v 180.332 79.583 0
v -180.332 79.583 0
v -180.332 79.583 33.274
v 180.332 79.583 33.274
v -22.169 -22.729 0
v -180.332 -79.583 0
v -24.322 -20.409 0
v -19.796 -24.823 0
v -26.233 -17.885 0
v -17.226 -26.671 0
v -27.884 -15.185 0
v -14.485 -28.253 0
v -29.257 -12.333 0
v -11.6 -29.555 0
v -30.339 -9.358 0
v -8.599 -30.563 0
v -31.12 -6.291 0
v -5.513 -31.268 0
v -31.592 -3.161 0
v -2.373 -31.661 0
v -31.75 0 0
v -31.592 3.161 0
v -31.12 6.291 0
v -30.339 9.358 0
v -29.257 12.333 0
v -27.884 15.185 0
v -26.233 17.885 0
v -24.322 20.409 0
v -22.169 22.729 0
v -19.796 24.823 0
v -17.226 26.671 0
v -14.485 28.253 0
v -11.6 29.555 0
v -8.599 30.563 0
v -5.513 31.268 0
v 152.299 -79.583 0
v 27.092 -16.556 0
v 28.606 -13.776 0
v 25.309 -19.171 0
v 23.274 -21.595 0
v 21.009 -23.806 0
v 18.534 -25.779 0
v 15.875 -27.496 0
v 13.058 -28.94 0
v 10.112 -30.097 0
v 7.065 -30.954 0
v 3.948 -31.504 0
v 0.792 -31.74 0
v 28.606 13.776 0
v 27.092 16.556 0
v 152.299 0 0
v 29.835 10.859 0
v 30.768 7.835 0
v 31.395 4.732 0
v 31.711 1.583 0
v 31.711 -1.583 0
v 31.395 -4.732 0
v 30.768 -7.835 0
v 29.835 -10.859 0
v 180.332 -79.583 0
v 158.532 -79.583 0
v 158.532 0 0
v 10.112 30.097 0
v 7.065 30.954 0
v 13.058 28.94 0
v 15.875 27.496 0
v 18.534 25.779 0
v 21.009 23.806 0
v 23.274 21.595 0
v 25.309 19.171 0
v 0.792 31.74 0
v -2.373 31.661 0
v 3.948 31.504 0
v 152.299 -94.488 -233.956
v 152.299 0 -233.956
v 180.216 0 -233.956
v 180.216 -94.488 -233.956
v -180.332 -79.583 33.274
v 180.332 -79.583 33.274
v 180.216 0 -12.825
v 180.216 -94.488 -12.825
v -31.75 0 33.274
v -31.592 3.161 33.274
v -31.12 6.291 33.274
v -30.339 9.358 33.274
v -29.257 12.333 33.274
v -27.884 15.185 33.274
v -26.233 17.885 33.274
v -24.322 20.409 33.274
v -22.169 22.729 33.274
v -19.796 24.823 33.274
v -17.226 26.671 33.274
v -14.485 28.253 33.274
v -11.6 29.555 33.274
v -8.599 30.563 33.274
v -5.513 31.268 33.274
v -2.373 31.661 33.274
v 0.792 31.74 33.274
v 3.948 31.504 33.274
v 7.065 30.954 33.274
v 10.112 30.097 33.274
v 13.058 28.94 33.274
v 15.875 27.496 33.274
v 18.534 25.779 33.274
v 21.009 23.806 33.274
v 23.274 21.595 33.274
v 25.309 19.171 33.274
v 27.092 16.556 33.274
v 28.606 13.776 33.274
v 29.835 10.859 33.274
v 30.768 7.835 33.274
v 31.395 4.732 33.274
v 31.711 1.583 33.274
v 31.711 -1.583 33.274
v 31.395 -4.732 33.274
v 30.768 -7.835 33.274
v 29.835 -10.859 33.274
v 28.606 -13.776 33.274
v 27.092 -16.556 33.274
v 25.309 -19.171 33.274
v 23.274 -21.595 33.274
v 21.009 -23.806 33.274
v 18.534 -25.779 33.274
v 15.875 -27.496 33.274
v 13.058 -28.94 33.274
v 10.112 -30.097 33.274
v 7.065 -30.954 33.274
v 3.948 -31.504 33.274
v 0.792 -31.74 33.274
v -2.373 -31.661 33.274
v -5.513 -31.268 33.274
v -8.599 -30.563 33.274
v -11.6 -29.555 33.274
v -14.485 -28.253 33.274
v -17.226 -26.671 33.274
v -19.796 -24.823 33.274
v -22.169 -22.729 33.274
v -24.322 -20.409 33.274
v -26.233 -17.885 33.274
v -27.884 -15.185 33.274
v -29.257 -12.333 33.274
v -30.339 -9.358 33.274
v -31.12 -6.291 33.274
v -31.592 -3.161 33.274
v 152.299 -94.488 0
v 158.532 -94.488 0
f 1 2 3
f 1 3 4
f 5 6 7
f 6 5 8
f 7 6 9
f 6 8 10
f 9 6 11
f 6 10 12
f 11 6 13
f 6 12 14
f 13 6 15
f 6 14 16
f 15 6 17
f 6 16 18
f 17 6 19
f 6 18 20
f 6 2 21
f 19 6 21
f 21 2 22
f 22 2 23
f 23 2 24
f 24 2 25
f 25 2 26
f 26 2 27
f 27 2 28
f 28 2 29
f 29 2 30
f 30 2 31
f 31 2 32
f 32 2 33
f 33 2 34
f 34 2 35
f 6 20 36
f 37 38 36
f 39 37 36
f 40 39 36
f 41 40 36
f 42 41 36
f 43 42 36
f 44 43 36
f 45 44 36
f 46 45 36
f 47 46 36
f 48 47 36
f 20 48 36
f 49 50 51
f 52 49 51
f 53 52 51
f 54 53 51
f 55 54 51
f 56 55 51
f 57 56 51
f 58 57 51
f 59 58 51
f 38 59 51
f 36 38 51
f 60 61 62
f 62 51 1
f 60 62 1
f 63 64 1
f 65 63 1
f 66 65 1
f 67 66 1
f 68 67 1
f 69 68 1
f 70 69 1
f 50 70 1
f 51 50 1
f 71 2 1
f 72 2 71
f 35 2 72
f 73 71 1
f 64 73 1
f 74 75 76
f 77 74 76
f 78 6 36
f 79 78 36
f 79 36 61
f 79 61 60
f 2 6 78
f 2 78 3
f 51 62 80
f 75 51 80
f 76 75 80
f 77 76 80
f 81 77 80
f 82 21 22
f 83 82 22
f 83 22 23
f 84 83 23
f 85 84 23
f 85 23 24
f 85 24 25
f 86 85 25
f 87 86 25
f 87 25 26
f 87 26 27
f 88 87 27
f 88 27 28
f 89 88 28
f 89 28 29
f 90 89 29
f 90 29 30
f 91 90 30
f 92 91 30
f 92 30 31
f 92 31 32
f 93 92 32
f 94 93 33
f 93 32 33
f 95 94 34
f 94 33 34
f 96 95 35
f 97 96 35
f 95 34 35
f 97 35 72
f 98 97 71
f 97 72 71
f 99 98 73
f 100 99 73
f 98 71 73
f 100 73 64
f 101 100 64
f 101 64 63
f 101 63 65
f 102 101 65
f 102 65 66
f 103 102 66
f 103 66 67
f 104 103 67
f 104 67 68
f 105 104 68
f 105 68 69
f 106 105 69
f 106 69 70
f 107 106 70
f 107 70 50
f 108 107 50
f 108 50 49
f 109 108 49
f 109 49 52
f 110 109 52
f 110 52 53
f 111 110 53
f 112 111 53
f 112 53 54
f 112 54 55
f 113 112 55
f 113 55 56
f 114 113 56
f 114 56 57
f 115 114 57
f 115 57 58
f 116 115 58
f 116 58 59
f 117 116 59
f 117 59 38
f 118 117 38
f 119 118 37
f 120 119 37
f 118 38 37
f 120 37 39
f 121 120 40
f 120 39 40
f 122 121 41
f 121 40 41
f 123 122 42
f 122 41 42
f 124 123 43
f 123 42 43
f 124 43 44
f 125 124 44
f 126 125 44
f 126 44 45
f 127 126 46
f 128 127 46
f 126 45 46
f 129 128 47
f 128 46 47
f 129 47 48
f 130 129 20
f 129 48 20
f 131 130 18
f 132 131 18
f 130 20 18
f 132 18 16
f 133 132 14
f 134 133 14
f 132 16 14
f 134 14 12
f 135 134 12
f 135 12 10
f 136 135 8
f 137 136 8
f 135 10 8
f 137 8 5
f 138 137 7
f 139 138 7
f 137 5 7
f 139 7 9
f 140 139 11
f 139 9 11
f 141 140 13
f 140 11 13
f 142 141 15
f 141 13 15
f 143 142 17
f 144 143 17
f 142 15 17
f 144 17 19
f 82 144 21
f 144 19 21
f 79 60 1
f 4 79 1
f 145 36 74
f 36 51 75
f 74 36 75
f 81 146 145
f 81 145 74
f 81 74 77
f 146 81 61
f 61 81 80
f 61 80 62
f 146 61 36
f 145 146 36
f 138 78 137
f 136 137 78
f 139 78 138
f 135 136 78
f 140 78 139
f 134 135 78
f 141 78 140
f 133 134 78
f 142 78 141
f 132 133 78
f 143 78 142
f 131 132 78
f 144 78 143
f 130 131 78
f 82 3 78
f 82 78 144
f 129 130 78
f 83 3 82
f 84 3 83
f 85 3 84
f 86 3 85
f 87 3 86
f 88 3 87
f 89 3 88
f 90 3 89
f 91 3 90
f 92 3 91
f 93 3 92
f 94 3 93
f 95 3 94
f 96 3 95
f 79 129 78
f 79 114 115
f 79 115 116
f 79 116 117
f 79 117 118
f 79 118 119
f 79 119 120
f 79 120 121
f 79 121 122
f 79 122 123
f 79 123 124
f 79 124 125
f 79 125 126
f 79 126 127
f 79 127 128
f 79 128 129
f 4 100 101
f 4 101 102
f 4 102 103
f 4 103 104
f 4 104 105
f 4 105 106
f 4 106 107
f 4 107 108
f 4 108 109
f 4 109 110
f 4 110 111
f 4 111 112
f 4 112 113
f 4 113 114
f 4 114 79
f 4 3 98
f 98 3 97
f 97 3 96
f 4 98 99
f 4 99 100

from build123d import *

# Parameters (mm, degrees)
F0_W     = 360.66404
F0_H     = 159.165882
F1_DEPTH = 33.274
F3_DEPTH = 94.488
F5_D     = 63.5


with BuildPart() as f1:
    # F0 (on Top) → F1 (new body)
    with BuildSketch(Plane.XY):
        Rectangle(F0_W, F0_H)
    extrude(amount=F1_DEPTH)

    # F2 (on Front) → F3 (join)
    with BuildSketch(Plane.XZ):
        Polygon((158.531552, 0), (152.299196, 0), (152.299196, -233.95633), (180.216238, -233.95633), (180.216238, -12.82501), align=None)
    extrude(amount=F3_DEPTH)

    # F5 (through all)
    with Locations(Plane.XY.offset(33.274)):
        with Locations((0, 0)):
            Hole(F5_D / 2)


solid = f1.part
